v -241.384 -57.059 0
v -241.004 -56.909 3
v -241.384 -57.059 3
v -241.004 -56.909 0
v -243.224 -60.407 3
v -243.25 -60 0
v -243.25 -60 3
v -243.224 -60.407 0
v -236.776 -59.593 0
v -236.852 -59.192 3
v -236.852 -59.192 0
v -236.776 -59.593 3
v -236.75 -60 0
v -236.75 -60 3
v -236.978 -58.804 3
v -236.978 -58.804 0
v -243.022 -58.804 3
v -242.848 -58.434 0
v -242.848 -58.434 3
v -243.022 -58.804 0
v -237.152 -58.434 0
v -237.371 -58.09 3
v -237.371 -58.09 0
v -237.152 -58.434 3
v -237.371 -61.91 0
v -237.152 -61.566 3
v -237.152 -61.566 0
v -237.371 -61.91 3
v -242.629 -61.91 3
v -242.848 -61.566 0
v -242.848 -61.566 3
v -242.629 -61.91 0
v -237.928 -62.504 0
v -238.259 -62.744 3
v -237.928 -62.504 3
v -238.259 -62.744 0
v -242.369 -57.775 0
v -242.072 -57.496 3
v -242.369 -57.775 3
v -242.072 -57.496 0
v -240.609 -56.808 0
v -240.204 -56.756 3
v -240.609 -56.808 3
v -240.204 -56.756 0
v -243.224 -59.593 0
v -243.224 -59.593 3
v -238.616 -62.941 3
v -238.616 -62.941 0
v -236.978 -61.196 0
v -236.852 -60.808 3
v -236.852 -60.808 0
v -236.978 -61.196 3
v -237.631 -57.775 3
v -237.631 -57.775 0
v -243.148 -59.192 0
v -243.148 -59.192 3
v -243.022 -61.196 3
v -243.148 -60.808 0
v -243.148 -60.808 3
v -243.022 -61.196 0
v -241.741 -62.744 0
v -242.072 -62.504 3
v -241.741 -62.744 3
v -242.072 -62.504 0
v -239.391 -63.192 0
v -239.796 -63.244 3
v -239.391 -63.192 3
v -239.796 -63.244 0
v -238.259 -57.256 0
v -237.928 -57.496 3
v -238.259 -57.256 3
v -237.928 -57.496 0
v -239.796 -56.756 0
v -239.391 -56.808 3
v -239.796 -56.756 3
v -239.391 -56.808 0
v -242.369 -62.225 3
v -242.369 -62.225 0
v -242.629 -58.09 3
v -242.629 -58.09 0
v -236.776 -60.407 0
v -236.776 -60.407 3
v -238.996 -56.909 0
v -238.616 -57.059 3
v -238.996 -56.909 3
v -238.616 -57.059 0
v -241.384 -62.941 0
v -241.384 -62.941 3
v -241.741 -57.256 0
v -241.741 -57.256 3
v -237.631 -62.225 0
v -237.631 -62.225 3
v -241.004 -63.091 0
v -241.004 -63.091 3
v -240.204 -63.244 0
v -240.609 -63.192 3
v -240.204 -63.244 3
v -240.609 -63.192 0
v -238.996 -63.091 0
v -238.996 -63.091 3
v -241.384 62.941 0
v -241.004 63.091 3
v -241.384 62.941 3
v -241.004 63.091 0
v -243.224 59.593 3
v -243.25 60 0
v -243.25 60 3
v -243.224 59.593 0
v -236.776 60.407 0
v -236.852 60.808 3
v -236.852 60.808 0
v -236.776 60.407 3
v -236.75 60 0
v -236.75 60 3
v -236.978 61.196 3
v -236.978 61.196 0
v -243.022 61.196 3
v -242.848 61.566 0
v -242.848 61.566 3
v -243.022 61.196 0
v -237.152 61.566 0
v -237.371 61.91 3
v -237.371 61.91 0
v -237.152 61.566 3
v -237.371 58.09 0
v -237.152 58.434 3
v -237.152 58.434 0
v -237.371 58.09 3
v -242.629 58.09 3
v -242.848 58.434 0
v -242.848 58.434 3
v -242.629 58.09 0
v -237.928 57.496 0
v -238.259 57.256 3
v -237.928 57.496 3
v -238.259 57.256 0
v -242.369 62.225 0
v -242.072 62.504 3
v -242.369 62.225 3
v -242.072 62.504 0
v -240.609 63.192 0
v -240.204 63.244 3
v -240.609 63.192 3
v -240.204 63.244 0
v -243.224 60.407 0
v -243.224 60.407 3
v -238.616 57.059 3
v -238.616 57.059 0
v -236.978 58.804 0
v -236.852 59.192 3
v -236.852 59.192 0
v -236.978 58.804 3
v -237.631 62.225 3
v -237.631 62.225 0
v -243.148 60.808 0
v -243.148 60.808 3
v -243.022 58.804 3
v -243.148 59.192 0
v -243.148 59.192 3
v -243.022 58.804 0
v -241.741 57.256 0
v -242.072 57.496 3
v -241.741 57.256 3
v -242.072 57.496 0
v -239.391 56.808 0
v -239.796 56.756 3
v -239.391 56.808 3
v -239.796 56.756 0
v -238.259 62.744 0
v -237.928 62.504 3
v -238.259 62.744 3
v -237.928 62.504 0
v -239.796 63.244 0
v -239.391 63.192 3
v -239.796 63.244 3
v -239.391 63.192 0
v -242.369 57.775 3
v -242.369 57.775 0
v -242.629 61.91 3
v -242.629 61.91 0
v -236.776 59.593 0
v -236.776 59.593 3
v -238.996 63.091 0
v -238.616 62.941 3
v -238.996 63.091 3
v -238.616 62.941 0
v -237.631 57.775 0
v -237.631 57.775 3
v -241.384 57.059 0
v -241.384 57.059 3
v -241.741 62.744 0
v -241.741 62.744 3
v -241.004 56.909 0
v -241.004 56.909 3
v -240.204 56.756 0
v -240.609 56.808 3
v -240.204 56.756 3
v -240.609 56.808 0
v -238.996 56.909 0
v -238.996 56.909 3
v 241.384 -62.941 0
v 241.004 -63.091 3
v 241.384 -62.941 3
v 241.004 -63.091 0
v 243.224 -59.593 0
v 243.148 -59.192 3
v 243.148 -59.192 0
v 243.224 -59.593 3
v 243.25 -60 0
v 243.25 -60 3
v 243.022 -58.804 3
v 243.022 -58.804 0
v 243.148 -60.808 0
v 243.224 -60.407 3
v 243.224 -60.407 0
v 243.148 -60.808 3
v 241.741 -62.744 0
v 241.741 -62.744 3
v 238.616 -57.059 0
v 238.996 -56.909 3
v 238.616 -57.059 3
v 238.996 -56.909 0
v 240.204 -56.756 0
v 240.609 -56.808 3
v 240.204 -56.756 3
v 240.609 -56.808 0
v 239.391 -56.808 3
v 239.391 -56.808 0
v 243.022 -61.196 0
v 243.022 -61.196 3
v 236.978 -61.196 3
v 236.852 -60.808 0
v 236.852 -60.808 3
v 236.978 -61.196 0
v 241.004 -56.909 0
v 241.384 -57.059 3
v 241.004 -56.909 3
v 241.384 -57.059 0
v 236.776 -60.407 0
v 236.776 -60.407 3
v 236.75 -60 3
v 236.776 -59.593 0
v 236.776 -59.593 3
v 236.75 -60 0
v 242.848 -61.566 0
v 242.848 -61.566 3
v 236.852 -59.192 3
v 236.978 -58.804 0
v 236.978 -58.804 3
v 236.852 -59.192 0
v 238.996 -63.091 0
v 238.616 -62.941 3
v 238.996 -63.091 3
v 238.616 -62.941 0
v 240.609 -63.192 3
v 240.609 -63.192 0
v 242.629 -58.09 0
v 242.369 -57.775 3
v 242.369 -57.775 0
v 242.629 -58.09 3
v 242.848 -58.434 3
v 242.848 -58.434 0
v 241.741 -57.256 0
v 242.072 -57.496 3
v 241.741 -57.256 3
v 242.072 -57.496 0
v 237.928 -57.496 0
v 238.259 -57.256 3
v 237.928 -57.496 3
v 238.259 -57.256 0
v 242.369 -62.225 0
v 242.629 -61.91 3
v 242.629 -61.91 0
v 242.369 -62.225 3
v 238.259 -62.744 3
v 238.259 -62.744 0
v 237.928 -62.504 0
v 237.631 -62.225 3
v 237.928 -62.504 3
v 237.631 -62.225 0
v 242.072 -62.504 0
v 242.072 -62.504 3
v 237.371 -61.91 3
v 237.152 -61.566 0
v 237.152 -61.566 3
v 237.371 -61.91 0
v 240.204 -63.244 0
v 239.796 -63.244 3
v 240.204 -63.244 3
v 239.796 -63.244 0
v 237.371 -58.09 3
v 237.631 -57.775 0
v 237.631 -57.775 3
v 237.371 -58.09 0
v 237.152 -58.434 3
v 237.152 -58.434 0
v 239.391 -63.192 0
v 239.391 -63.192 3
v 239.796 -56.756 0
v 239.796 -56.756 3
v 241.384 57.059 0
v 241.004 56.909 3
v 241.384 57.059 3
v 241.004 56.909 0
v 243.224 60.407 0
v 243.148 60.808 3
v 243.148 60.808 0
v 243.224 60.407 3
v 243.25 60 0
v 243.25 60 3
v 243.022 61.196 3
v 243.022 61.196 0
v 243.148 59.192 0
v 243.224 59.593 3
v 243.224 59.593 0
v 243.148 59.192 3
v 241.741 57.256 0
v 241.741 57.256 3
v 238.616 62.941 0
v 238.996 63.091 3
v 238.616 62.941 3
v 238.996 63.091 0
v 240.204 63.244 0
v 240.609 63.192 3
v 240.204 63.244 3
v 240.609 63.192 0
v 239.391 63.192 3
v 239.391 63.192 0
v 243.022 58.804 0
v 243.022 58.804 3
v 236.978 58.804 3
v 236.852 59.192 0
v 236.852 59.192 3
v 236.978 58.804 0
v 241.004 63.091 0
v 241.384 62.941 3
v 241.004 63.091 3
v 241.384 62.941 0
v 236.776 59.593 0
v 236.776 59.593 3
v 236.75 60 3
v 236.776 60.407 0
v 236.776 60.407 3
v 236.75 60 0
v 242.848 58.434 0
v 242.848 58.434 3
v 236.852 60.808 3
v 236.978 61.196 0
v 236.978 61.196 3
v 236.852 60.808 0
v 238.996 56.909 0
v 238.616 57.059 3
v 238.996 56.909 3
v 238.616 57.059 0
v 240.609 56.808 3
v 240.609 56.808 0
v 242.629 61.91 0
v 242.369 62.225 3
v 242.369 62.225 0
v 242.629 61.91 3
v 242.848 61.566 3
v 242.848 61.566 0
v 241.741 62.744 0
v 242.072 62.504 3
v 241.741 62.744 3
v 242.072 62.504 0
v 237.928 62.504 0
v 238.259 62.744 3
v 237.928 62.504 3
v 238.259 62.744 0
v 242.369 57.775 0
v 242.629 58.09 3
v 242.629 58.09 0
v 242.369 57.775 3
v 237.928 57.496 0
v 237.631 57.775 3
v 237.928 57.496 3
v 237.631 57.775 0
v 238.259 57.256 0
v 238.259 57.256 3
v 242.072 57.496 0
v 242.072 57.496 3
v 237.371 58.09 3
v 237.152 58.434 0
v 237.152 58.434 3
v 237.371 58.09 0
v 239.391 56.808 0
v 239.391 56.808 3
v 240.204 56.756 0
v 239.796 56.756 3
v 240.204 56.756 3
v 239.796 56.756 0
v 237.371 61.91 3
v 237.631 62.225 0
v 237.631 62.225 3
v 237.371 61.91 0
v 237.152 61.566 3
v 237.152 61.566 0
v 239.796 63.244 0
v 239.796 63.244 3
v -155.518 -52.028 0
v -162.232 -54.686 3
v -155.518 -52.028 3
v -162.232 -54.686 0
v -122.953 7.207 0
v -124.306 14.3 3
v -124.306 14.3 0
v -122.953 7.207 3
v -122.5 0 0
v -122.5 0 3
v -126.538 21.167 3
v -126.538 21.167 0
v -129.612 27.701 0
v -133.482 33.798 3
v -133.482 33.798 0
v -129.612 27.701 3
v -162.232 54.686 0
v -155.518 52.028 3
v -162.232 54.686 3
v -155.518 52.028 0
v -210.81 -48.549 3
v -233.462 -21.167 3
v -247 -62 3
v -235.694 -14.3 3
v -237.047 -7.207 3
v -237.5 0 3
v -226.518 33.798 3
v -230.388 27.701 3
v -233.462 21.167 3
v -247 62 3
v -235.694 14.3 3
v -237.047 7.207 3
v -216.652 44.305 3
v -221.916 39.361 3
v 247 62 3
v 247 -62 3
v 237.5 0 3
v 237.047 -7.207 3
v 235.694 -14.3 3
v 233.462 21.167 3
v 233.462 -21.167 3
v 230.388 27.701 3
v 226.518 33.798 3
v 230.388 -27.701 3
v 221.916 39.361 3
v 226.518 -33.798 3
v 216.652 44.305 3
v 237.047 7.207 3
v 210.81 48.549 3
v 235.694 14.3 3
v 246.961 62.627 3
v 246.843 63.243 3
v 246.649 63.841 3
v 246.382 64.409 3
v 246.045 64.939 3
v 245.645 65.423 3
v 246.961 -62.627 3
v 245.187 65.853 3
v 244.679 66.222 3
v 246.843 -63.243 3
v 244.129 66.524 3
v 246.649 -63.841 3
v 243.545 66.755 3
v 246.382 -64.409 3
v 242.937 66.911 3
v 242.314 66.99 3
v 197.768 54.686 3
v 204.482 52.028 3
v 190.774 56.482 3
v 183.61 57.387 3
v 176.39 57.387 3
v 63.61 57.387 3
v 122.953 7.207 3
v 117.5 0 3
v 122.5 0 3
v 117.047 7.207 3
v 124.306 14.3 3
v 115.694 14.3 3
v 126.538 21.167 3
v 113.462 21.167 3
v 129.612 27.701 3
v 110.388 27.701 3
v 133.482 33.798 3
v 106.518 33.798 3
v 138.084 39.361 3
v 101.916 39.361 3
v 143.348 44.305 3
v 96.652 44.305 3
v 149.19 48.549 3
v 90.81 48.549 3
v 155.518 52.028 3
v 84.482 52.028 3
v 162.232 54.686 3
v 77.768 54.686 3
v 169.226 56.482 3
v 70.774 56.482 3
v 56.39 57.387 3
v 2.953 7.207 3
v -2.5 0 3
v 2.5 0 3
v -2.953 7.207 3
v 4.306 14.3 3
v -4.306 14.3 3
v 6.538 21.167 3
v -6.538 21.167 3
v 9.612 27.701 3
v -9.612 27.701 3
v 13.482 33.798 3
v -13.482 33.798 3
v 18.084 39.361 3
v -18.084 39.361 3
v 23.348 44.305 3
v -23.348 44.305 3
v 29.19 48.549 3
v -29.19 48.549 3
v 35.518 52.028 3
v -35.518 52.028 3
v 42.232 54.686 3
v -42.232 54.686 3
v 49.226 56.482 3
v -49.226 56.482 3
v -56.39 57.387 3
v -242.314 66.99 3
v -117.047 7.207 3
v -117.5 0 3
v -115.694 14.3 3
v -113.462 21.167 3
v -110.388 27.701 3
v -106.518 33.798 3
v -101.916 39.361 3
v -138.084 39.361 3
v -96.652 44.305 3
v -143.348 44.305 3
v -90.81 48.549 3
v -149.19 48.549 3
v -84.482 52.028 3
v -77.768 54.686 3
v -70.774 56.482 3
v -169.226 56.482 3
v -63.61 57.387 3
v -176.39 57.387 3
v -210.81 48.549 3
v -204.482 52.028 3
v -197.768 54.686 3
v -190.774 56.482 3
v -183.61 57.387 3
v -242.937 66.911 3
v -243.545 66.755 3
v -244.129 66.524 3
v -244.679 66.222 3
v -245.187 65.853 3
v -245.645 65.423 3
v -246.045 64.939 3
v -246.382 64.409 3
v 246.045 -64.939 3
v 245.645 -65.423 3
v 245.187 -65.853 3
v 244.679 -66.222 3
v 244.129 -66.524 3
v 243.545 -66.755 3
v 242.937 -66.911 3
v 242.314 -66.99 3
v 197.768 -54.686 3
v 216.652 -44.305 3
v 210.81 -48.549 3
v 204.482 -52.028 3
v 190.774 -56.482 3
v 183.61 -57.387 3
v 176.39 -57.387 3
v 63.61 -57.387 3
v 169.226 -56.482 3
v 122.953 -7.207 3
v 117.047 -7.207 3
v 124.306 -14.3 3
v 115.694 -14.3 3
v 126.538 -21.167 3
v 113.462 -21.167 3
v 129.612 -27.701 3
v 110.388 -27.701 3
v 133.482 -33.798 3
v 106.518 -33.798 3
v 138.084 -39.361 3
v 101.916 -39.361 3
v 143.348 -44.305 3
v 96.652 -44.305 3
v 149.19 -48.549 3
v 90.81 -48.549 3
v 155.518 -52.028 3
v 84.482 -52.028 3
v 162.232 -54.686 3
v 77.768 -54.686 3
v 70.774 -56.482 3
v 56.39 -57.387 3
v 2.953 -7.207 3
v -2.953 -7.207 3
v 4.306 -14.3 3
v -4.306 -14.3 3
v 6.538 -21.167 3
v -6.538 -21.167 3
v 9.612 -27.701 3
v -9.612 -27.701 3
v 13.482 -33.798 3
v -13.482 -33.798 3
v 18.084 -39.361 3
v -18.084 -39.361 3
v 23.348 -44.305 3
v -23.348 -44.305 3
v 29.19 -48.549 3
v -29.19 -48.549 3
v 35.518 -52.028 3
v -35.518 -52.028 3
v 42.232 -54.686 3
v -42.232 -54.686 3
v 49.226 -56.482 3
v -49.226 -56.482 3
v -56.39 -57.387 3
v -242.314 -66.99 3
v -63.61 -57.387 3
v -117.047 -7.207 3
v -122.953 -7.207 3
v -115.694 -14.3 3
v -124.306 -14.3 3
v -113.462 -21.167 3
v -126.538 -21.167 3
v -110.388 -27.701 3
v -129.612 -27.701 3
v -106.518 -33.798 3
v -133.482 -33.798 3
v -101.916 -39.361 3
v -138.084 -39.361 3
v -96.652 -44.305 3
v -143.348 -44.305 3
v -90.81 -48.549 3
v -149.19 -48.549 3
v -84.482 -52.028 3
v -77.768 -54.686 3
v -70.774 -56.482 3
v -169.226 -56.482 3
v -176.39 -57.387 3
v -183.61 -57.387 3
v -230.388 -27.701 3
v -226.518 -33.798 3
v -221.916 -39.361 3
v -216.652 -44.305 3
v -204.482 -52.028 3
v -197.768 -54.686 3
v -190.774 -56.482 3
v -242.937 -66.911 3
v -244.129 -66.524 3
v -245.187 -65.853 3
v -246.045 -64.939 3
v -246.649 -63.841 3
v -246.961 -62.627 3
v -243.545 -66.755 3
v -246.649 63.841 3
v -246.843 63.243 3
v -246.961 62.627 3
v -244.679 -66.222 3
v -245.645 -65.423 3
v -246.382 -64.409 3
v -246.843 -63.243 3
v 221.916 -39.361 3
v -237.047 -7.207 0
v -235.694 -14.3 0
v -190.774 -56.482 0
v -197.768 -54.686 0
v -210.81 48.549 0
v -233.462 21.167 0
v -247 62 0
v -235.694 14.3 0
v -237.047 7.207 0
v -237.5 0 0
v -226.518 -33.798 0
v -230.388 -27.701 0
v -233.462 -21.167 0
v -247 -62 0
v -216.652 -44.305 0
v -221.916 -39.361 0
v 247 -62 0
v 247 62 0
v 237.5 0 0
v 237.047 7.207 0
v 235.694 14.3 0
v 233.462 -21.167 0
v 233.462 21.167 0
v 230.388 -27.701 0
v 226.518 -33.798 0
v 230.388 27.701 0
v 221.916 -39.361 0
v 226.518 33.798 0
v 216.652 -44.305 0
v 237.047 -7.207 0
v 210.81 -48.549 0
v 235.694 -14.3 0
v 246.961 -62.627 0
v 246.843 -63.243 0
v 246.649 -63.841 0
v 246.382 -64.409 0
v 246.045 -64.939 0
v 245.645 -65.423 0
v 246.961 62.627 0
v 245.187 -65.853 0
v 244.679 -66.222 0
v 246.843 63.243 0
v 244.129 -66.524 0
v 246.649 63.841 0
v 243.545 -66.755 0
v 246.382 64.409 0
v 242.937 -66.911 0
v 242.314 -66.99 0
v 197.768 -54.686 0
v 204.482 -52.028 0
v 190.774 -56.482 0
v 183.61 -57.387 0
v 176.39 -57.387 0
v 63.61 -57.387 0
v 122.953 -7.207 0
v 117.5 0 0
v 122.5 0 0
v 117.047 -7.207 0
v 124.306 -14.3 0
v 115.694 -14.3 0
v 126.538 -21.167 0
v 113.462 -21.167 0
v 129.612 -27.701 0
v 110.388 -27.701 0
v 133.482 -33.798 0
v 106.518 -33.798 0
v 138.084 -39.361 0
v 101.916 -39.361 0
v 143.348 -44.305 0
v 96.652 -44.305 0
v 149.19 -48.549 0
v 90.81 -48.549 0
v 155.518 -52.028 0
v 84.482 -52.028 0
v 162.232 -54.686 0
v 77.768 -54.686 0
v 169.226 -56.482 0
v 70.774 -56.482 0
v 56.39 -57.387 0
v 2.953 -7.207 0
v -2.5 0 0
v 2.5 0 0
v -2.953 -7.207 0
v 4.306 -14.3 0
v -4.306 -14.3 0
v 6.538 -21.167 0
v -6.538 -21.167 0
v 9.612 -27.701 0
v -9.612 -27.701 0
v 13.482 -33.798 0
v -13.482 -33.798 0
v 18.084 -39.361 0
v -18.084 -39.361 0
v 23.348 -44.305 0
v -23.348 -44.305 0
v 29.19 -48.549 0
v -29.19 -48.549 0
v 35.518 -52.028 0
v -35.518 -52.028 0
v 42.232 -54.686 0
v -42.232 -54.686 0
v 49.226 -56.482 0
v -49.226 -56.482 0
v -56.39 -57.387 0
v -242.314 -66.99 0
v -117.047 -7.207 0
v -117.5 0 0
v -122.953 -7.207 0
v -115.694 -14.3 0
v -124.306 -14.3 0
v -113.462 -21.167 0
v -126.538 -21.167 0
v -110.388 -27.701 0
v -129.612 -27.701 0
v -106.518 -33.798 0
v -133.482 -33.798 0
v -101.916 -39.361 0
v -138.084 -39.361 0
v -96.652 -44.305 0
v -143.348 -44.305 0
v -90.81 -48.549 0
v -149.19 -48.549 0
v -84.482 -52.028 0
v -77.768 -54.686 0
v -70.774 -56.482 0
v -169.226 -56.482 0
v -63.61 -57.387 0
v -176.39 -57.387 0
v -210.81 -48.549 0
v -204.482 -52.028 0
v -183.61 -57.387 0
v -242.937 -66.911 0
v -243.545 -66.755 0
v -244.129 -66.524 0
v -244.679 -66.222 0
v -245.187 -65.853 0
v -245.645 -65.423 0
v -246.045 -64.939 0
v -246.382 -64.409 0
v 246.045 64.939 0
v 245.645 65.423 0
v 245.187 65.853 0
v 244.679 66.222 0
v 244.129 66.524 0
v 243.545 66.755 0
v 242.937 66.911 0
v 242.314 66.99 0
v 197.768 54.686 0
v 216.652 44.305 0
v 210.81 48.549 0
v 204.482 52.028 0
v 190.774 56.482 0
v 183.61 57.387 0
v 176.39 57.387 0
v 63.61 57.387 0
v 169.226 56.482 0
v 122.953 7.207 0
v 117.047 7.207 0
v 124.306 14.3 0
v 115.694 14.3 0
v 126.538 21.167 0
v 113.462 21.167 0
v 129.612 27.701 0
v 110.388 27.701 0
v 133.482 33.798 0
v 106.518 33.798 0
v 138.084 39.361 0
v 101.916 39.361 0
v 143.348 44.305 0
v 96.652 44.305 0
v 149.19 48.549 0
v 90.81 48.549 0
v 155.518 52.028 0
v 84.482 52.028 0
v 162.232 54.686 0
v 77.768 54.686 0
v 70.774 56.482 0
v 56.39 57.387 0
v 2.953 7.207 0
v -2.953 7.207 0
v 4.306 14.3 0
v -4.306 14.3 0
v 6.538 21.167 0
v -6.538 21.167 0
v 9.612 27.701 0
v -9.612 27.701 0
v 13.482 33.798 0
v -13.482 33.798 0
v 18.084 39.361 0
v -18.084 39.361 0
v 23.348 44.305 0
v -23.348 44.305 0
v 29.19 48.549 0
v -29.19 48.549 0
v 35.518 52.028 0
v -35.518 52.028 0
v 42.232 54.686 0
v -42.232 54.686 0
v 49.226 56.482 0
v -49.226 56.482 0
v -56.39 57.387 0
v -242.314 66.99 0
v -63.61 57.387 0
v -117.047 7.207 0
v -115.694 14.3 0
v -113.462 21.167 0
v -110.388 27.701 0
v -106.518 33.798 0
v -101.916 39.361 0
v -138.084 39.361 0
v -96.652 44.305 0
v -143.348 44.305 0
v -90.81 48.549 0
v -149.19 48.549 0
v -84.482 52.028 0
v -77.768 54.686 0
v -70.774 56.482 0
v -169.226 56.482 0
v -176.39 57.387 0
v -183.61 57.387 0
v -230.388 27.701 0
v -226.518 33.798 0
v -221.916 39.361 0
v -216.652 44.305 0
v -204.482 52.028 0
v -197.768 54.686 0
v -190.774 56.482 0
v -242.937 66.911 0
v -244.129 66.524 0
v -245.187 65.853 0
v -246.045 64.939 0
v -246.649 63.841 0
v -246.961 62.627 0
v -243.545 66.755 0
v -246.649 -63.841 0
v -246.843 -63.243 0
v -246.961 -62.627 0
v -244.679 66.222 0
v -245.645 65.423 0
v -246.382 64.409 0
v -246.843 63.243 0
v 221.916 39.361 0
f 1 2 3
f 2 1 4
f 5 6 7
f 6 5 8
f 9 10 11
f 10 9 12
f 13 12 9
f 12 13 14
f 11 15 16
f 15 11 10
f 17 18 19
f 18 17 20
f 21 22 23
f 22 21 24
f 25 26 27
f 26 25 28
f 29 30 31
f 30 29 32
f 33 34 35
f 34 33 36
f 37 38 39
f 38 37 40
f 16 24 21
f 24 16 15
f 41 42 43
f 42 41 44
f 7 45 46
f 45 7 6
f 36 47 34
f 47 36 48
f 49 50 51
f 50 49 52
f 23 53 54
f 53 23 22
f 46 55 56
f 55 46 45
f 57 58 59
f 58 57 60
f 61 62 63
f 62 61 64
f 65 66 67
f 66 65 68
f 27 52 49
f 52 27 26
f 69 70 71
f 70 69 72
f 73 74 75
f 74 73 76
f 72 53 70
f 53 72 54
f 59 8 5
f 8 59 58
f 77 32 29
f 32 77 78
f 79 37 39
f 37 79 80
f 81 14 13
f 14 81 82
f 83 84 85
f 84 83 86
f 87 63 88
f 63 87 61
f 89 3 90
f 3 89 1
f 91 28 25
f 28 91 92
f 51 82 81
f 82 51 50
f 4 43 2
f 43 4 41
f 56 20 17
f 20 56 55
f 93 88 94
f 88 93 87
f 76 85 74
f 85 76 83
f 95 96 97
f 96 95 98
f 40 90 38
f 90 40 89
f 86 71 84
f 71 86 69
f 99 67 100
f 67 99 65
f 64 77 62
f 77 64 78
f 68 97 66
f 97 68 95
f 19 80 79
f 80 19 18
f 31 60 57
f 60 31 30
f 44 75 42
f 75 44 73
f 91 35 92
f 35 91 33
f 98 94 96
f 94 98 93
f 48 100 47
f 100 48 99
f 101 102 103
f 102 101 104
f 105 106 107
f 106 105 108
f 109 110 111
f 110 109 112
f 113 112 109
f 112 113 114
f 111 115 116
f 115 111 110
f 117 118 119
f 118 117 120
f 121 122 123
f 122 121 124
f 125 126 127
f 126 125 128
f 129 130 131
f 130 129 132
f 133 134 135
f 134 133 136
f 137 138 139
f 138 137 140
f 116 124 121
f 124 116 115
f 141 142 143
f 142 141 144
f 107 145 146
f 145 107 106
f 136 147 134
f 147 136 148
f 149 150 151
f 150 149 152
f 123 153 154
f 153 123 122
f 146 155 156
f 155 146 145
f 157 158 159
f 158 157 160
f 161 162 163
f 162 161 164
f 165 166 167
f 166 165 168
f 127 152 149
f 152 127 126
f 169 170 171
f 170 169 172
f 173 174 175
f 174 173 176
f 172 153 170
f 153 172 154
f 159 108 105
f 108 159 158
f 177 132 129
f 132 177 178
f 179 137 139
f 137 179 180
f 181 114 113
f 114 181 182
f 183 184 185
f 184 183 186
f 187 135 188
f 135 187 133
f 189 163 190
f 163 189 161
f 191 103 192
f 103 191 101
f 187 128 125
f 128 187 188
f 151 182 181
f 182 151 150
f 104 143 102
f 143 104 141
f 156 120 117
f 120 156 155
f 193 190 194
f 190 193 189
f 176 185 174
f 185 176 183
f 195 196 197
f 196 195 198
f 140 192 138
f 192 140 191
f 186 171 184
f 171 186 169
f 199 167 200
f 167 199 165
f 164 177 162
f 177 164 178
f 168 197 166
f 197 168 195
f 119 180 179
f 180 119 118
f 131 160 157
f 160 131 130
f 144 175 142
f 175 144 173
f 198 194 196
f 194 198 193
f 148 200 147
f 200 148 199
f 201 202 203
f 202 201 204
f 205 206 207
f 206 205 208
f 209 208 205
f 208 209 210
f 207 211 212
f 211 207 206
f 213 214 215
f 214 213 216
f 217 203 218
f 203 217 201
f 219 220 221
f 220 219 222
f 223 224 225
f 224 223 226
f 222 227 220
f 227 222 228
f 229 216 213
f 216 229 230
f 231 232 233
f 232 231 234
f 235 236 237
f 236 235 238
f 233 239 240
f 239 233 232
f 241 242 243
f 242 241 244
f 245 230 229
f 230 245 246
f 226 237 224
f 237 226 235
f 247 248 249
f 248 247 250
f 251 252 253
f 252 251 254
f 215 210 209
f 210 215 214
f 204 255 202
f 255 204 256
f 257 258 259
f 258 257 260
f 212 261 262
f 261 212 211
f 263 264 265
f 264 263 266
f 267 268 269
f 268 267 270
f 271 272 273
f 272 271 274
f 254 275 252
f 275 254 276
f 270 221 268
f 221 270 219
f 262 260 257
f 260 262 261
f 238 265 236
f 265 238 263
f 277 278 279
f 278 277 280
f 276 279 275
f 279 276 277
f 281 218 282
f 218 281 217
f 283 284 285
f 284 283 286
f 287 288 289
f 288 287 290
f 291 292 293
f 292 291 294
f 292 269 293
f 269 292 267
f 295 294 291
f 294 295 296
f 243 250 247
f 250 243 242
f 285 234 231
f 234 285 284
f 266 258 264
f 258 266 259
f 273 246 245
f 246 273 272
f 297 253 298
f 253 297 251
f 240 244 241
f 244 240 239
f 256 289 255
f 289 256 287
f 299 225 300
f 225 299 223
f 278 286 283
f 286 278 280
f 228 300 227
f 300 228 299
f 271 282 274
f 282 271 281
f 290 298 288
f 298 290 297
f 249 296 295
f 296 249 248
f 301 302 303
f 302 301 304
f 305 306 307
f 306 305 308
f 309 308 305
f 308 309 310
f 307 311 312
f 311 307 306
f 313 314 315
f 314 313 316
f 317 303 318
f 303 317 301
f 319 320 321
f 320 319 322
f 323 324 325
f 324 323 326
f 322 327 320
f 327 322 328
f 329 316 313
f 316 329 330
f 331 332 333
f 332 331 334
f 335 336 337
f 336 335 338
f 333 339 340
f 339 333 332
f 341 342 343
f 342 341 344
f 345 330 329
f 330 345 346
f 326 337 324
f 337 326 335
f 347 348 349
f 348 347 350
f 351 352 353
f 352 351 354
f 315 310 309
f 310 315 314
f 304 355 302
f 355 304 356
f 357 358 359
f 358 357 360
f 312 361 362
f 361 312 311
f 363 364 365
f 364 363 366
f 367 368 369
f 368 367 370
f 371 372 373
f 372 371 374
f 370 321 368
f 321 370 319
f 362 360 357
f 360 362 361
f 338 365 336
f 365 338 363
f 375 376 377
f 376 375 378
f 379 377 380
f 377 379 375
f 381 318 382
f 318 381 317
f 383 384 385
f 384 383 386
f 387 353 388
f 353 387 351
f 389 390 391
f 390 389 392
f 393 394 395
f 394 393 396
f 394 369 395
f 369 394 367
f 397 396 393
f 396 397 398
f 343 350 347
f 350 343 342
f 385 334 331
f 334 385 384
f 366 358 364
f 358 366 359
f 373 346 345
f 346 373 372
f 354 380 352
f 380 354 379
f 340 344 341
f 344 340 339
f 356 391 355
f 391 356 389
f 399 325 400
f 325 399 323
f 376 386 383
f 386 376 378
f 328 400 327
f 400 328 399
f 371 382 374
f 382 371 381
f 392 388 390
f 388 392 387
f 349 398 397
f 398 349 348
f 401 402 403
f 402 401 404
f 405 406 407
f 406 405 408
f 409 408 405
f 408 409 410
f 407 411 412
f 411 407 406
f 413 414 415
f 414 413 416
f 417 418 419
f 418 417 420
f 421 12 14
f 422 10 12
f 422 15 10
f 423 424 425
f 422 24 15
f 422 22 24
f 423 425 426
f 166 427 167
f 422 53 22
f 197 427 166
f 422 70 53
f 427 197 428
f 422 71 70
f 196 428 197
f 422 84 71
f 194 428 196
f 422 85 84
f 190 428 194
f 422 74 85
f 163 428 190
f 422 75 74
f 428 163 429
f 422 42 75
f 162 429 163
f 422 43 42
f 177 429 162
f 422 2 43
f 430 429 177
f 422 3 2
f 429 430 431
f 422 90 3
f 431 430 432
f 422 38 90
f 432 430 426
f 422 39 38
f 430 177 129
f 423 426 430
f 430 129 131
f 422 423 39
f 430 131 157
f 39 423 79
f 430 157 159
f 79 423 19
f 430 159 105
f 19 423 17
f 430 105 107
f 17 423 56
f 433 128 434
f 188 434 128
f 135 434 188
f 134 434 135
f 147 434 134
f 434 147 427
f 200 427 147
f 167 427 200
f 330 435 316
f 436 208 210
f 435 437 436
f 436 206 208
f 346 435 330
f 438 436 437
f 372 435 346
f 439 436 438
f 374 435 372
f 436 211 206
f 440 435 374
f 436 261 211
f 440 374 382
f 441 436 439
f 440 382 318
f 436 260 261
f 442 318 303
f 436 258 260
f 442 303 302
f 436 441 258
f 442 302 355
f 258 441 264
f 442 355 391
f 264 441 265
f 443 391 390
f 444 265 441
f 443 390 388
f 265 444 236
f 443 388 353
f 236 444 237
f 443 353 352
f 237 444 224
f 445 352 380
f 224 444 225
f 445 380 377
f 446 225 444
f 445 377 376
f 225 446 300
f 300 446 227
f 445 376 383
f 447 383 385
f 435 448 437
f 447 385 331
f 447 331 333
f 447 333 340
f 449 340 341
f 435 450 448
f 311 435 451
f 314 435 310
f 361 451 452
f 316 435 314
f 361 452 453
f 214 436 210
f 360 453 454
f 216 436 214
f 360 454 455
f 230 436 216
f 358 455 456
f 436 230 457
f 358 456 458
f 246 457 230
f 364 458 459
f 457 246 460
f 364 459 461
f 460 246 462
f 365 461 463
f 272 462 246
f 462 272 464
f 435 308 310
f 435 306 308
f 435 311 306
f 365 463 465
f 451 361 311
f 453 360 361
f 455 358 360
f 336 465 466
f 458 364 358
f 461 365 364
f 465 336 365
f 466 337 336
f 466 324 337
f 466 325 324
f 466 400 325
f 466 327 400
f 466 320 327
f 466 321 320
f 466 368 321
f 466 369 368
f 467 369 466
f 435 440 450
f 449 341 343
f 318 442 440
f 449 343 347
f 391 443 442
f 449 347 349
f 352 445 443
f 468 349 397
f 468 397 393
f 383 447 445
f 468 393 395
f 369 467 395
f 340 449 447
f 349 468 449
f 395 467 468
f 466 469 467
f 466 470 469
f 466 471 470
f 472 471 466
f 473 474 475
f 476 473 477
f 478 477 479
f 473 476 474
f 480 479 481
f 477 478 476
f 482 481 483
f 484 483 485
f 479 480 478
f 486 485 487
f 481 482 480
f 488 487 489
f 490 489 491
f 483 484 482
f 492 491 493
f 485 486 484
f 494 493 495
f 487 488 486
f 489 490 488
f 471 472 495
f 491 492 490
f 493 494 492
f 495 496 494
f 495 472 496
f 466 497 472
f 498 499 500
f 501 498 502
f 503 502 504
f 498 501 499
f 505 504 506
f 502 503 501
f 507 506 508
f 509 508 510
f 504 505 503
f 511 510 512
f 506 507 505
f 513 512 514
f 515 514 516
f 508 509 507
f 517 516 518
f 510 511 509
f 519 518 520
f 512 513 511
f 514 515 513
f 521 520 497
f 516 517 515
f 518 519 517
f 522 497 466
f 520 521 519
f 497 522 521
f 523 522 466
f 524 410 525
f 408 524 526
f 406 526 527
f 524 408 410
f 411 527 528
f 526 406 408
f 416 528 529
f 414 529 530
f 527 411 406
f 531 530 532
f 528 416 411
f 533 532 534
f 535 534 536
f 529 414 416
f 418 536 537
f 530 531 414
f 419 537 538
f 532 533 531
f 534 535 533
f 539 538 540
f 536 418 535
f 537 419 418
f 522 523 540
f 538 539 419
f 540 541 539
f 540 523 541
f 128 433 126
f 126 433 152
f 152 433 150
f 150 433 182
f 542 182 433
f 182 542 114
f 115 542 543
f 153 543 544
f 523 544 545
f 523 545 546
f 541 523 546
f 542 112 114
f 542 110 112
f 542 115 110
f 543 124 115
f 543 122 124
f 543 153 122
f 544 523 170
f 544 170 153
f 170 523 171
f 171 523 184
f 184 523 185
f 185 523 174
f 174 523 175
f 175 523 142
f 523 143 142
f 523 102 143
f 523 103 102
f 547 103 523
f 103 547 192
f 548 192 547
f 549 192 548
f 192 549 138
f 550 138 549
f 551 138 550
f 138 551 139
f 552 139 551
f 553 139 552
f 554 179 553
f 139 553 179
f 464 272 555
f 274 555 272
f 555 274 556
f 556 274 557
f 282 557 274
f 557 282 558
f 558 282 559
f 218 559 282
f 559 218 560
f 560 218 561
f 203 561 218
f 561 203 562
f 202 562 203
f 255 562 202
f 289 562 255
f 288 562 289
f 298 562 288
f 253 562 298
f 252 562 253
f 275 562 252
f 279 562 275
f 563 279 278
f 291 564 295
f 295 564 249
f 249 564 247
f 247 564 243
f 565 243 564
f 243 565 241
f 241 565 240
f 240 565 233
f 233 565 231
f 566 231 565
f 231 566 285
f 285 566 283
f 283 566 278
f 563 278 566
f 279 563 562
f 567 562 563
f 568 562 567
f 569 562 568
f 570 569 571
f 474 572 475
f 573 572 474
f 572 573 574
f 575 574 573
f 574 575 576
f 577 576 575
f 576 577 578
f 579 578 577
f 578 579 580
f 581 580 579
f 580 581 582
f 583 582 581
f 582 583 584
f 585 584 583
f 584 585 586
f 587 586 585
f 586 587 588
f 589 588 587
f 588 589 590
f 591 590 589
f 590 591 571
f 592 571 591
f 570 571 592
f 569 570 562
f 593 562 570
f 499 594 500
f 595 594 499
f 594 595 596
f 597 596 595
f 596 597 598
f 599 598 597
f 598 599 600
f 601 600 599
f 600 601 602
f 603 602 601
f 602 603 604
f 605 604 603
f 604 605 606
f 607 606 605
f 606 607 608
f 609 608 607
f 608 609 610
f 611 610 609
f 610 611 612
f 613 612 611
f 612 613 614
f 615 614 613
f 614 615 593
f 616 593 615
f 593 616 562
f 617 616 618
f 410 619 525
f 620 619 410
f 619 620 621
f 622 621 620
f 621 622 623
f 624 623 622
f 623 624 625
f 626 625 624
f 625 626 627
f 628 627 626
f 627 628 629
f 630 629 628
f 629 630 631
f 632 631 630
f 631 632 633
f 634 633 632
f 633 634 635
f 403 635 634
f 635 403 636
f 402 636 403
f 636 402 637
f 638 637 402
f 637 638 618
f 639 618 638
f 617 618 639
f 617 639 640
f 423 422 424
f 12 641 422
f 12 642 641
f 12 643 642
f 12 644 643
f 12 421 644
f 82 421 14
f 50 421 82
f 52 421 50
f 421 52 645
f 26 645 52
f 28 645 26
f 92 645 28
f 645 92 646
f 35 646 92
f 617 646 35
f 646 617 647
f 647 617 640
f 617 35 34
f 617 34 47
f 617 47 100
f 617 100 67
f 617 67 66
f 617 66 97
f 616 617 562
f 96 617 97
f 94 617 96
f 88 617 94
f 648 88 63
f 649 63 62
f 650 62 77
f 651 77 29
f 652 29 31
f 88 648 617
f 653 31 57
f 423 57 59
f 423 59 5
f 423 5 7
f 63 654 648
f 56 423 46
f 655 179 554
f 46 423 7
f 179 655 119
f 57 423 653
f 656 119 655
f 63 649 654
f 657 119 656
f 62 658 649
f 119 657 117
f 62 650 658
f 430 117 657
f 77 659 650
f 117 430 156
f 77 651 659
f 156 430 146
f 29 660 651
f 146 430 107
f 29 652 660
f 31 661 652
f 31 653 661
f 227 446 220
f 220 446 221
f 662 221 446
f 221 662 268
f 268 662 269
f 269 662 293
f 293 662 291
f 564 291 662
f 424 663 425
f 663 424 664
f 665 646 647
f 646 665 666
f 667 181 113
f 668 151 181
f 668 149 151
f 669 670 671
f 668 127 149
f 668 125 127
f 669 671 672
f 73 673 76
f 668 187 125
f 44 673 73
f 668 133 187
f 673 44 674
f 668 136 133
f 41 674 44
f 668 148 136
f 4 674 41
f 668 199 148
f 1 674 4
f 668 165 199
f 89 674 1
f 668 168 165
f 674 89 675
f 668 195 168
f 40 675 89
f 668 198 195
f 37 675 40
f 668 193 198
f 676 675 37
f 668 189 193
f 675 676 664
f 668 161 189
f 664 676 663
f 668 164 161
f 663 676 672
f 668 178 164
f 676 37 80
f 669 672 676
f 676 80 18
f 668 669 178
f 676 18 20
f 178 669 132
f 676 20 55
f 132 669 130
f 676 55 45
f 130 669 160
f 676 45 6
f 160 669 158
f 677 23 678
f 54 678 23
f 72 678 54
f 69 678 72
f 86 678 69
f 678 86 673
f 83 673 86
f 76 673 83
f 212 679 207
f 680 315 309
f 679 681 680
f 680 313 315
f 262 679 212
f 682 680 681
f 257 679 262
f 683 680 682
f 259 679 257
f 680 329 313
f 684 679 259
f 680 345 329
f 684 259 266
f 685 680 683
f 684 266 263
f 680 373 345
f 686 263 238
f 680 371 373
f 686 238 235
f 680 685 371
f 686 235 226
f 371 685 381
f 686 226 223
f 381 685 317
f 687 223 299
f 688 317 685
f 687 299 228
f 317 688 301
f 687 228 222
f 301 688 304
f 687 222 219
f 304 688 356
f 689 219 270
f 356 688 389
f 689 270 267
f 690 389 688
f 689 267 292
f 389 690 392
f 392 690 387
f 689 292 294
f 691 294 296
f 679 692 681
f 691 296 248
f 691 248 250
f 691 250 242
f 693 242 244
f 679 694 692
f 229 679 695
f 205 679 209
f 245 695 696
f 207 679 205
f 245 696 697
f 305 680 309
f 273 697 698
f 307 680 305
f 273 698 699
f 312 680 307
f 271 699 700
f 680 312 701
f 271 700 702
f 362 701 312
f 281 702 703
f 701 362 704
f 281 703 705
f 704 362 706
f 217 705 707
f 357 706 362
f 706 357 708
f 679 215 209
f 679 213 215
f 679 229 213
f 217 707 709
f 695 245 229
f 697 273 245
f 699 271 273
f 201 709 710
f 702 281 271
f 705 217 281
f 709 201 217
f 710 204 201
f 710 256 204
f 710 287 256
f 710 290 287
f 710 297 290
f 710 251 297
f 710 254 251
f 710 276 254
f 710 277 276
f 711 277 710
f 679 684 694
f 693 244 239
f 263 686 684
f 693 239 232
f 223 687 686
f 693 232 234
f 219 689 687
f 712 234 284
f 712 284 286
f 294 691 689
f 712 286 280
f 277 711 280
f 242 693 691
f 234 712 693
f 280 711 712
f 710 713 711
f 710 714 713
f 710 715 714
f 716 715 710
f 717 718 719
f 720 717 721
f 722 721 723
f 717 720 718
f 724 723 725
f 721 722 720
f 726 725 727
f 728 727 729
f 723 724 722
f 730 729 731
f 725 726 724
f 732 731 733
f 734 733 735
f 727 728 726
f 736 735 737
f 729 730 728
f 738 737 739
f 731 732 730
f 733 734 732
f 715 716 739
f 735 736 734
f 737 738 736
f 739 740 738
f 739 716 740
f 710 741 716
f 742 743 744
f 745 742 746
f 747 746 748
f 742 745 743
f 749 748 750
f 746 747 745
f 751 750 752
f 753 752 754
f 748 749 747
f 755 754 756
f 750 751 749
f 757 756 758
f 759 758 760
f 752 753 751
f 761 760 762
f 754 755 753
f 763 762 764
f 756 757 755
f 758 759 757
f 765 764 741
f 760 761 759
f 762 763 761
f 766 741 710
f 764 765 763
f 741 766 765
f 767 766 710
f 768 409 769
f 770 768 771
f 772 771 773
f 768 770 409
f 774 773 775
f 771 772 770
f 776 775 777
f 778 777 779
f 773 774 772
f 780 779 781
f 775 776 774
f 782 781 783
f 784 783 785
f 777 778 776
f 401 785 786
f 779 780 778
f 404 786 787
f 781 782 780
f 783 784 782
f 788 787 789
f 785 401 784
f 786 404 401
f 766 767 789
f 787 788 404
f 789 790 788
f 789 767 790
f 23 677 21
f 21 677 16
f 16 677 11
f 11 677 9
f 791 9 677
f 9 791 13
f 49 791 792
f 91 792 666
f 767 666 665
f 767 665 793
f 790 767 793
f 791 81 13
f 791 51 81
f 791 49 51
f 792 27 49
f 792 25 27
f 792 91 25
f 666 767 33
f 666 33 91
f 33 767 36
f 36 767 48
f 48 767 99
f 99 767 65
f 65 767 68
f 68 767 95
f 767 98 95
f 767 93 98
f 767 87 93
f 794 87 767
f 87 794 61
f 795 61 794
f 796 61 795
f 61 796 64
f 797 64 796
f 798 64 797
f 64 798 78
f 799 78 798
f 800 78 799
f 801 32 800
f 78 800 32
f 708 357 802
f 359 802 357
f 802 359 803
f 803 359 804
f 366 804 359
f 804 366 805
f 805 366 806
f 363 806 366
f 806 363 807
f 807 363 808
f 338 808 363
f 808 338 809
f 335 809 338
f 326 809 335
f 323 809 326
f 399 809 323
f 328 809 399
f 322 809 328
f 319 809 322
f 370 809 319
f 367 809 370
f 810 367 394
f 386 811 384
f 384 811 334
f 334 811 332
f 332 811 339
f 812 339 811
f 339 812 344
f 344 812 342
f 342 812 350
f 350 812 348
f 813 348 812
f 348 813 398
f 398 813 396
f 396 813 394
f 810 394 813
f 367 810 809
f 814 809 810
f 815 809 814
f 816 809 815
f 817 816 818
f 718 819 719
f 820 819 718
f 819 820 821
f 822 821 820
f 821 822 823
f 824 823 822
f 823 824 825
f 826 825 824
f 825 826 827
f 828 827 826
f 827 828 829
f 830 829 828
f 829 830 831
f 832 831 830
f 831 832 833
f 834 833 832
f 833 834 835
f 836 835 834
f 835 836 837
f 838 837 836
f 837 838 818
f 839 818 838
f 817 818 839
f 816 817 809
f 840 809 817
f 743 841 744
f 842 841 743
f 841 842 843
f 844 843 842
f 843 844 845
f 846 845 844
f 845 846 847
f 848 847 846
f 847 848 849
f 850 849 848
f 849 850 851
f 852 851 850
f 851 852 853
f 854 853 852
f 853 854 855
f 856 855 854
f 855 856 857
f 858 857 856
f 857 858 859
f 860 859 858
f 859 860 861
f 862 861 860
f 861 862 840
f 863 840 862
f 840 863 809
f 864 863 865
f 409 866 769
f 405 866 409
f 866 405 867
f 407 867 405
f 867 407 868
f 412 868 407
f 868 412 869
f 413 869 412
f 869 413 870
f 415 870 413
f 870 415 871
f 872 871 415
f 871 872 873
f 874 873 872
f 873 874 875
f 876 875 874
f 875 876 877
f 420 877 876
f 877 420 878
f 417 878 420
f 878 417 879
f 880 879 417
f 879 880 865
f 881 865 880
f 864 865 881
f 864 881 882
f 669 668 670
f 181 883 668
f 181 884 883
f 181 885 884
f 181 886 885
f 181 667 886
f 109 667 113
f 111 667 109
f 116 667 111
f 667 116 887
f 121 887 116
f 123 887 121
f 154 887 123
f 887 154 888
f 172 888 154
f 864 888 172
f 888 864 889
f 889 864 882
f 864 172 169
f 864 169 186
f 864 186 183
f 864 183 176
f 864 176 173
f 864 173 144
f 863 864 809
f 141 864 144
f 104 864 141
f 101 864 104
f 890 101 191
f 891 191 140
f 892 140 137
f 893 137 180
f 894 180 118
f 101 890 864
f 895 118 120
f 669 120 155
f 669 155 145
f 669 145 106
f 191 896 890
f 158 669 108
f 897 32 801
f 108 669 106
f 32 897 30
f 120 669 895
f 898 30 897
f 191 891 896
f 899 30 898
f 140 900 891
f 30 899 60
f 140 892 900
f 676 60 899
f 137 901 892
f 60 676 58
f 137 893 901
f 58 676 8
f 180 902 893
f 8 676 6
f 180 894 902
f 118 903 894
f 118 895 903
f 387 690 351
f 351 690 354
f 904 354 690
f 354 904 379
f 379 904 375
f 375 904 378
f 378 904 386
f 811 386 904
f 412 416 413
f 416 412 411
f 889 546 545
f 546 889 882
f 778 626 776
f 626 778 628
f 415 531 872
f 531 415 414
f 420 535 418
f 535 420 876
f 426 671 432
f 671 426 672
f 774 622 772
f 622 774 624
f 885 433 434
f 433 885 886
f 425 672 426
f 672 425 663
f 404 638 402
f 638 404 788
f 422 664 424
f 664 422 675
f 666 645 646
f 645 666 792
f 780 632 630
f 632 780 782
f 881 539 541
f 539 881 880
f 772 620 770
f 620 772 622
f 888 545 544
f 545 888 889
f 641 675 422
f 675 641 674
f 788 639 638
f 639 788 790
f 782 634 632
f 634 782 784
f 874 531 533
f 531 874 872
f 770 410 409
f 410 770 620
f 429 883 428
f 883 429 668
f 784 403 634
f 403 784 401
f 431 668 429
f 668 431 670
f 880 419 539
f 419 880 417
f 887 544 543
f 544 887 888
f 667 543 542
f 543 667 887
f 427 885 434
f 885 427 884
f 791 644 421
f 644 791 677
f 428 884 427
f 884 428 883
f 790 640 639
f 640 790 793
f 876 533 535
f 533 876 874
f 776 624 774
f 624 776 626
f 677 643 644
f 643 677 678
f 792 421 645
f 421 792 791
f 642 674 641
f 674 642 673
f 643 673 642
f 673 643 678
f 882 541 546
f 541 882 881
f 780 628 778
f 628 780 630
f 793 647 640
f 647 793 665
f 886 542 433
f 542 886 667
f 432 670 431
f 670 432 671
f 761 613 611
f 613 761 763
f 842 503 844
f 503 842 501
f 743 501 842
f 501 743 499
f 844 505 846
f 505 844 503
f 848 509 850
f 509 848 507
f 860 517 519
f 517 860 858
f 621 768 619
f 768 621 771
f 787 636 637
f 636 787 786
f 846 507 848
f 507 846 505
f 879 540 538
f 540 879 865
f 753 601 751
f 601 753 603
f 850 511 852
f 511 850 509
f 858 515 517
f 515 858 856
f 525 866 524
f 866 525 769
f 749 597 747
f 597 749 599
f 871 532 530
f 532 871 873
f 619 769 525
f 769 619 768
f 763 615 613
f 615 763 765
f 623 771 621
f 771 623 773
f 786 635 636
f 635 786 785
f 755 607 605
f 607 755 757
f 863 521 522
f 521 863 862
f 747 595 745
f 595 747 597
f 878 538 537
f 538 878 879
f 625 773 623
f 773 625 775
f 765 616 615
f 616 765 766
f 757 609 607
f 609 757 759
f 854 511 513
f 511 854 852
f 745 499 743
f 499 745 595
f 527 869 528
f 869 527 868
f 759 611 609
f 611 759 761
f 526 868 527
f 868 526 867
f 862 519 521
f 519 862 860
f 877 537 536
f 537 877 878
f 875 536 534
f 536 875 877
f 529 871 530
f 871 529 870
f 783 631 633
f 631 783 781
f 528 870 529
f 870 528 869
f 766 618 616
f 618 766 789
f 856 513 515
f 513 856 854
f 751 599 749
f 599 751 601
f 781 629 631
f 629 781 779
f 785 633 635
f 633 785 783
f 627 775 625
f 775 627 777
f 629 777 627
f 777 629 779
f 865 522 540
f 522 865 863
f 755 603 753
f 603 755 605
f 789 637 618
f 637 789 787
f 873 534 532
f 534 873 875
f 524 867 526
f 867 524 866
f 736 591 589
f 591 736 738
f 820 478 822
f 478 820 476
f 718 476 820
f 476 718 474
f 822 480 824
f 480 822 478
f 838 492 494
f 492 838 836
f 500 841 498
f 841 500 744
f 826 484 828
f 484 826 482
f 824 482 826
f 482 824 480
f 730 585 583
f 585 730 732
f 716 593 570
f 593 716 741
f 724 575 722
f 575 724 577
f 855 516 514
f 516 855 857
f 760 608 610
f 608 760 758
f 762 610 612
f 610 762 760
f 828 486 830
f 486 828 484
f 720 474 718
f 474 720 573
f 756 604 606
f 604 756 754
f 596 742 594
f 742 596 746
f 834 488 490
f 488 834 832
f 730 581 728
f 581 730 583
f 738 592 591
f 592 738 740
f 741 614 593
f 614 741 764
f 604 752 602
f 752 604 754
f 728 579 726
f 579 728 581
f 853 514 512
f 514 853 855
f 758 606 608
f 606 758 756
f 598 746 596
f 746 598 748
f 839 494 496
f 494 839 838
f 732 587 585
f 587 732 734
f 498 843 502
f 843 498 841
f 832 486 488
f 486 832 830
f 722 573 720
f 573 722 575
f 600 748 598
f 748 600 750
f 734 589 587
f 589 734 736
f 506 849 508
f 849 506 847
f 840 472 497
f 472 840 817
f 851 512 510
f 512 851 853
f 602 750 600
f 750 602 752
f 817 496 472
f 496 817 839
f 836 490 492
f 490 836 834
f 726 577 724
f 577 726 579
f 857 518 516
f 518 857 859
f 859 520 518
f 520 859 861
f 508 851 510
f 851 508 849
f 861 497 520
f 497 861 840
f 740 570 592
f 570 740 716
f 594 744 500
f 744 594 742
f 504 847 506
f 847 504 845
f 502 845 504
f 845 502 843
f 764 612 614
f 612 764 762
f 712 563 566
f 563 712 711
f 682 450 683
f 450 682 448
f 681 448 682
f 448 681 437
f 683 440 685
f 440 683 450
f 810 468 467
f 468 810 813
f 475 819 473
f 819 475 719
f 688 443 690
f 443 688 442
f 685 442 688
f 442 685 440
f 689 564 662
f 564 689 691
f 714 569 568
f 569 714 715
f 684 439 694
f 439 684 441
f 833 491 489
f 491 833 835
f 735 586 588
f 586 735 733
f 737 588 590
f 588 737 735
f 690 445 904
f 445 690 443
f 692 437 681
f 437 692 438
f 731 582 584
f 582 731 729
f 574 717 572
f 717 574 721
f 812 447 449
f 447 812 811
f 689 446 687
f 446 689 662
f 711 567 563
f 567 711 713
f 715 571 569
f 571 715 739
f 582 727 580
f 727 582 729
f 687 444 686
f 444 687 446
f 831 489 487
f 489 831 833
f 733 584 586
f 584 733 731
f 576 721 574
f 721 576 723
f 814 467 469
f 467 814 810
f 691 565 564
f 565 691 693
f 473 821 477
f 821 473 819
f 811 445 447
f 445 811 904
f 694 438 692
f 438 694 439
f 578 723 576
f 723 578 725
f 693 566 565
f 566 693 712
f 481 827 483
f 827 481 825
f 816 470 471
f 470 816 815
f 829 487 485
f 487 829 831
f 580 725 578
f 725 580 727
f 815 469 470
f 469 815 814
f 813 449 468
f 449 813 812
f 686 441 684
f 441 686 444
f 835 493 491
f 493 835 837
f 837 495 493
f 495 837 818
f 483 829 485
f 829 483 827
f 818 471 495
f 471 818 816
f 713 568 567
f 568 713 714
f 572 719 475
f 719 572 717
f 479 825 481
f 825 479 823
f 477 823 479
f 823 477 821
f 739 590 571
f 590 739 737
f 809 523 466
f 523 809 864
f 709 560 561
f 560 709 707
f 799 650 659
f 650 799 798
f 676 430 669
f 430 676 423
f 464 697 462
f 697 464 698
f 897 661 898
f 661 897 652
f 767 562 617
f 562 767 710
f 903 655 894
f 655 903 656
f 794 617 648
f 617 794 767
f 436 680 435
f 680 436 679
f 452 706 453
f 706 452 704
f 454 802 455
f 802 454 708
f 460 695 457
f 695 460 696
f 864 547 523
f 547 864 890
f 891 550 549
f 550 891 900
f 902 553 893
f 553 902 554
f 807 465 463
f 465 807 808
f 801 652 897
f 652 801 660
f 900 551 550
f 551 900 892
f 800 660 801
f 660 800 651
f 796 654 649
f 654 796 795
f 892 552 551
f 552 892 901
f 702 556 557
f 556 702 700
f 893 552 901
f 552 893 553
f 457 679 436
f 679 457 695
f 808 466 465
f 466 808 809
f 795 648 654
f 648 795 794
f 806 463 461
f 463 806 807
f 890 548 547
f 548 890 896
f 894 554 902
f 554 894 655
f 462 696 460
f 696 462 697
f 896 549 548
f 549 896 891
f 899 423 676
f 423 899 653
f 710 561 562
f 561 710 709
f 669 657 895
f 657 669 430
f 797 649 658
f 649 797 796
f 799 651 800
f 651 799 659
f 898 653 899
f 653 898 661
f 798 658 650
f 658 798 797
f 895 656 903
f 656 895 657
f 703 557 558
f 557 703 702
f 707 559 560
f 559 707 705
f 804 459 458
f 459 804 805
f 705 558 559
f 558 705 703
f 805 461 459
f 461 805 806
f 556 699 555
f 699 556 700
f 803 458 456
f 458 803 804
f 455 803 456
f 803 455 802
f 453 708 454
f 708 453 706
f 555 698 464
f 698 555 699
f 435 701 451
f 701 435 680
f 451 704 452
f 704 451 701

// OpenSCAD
$fn = 50;


difference() {
	union() {
		hull() {
			translate(v = [-242.0000000000, 62.0000000000, 0]) {
				cylinder(h = 3, r = 5);
			}
			translate(v = [242.0000000000, 62.0000000000, 0]) {
				cylinder(h = 3, r = 5);
			}
			translate(v = [-242.0000000000, -62.0000000000, 0]) {
				cylinder(h = 3, r = 5);
			}
			translate(v = [242.0000000000, -62.0000000000, 0]) {
				cylinder(h = 3, r = 5);
			}
		}
	}
	union() {
		#translate(v = [-240.0000000000, -60.0000000000, -100.0000000000]) {
			cylinder(h = 200, r = 3.2500000000);
		}
		#translate(v = [-240.0000000000, 60.0000000000, -100.0000000000]) {
			cylinder(h = 200, r = 3.2500000000);
		}
		#translate(v = [240.0000000000, -60.0000000000, -100.0000000000]) {
			cylinder(h = 200, r = 3.2500000000);
		}
		#translate(v = [240.0000000000, 60.0000000000, -100.0000000000]) {
			cylinder(h = 200, r = 3.2500000000);
		}
		#translate(v = [-180.0000000000, 0, 0]) {
			cylinder(h = 3, r = 57.5000000000);
		}
		#translate(v = [-60.0000000000, 0, 0]) {
			cylinder(h = 3, r = 57.5000000000);
		}
		#translate(v = [60.0000000000, 0, 0]) {
			cylinder(h = 3, r = 57.5000000000);
		}
		#translate(v = [180.0000000000, 0, 0]) {
			cylinder(h = 3, r = 57.5000000000);
		}
	}
}
